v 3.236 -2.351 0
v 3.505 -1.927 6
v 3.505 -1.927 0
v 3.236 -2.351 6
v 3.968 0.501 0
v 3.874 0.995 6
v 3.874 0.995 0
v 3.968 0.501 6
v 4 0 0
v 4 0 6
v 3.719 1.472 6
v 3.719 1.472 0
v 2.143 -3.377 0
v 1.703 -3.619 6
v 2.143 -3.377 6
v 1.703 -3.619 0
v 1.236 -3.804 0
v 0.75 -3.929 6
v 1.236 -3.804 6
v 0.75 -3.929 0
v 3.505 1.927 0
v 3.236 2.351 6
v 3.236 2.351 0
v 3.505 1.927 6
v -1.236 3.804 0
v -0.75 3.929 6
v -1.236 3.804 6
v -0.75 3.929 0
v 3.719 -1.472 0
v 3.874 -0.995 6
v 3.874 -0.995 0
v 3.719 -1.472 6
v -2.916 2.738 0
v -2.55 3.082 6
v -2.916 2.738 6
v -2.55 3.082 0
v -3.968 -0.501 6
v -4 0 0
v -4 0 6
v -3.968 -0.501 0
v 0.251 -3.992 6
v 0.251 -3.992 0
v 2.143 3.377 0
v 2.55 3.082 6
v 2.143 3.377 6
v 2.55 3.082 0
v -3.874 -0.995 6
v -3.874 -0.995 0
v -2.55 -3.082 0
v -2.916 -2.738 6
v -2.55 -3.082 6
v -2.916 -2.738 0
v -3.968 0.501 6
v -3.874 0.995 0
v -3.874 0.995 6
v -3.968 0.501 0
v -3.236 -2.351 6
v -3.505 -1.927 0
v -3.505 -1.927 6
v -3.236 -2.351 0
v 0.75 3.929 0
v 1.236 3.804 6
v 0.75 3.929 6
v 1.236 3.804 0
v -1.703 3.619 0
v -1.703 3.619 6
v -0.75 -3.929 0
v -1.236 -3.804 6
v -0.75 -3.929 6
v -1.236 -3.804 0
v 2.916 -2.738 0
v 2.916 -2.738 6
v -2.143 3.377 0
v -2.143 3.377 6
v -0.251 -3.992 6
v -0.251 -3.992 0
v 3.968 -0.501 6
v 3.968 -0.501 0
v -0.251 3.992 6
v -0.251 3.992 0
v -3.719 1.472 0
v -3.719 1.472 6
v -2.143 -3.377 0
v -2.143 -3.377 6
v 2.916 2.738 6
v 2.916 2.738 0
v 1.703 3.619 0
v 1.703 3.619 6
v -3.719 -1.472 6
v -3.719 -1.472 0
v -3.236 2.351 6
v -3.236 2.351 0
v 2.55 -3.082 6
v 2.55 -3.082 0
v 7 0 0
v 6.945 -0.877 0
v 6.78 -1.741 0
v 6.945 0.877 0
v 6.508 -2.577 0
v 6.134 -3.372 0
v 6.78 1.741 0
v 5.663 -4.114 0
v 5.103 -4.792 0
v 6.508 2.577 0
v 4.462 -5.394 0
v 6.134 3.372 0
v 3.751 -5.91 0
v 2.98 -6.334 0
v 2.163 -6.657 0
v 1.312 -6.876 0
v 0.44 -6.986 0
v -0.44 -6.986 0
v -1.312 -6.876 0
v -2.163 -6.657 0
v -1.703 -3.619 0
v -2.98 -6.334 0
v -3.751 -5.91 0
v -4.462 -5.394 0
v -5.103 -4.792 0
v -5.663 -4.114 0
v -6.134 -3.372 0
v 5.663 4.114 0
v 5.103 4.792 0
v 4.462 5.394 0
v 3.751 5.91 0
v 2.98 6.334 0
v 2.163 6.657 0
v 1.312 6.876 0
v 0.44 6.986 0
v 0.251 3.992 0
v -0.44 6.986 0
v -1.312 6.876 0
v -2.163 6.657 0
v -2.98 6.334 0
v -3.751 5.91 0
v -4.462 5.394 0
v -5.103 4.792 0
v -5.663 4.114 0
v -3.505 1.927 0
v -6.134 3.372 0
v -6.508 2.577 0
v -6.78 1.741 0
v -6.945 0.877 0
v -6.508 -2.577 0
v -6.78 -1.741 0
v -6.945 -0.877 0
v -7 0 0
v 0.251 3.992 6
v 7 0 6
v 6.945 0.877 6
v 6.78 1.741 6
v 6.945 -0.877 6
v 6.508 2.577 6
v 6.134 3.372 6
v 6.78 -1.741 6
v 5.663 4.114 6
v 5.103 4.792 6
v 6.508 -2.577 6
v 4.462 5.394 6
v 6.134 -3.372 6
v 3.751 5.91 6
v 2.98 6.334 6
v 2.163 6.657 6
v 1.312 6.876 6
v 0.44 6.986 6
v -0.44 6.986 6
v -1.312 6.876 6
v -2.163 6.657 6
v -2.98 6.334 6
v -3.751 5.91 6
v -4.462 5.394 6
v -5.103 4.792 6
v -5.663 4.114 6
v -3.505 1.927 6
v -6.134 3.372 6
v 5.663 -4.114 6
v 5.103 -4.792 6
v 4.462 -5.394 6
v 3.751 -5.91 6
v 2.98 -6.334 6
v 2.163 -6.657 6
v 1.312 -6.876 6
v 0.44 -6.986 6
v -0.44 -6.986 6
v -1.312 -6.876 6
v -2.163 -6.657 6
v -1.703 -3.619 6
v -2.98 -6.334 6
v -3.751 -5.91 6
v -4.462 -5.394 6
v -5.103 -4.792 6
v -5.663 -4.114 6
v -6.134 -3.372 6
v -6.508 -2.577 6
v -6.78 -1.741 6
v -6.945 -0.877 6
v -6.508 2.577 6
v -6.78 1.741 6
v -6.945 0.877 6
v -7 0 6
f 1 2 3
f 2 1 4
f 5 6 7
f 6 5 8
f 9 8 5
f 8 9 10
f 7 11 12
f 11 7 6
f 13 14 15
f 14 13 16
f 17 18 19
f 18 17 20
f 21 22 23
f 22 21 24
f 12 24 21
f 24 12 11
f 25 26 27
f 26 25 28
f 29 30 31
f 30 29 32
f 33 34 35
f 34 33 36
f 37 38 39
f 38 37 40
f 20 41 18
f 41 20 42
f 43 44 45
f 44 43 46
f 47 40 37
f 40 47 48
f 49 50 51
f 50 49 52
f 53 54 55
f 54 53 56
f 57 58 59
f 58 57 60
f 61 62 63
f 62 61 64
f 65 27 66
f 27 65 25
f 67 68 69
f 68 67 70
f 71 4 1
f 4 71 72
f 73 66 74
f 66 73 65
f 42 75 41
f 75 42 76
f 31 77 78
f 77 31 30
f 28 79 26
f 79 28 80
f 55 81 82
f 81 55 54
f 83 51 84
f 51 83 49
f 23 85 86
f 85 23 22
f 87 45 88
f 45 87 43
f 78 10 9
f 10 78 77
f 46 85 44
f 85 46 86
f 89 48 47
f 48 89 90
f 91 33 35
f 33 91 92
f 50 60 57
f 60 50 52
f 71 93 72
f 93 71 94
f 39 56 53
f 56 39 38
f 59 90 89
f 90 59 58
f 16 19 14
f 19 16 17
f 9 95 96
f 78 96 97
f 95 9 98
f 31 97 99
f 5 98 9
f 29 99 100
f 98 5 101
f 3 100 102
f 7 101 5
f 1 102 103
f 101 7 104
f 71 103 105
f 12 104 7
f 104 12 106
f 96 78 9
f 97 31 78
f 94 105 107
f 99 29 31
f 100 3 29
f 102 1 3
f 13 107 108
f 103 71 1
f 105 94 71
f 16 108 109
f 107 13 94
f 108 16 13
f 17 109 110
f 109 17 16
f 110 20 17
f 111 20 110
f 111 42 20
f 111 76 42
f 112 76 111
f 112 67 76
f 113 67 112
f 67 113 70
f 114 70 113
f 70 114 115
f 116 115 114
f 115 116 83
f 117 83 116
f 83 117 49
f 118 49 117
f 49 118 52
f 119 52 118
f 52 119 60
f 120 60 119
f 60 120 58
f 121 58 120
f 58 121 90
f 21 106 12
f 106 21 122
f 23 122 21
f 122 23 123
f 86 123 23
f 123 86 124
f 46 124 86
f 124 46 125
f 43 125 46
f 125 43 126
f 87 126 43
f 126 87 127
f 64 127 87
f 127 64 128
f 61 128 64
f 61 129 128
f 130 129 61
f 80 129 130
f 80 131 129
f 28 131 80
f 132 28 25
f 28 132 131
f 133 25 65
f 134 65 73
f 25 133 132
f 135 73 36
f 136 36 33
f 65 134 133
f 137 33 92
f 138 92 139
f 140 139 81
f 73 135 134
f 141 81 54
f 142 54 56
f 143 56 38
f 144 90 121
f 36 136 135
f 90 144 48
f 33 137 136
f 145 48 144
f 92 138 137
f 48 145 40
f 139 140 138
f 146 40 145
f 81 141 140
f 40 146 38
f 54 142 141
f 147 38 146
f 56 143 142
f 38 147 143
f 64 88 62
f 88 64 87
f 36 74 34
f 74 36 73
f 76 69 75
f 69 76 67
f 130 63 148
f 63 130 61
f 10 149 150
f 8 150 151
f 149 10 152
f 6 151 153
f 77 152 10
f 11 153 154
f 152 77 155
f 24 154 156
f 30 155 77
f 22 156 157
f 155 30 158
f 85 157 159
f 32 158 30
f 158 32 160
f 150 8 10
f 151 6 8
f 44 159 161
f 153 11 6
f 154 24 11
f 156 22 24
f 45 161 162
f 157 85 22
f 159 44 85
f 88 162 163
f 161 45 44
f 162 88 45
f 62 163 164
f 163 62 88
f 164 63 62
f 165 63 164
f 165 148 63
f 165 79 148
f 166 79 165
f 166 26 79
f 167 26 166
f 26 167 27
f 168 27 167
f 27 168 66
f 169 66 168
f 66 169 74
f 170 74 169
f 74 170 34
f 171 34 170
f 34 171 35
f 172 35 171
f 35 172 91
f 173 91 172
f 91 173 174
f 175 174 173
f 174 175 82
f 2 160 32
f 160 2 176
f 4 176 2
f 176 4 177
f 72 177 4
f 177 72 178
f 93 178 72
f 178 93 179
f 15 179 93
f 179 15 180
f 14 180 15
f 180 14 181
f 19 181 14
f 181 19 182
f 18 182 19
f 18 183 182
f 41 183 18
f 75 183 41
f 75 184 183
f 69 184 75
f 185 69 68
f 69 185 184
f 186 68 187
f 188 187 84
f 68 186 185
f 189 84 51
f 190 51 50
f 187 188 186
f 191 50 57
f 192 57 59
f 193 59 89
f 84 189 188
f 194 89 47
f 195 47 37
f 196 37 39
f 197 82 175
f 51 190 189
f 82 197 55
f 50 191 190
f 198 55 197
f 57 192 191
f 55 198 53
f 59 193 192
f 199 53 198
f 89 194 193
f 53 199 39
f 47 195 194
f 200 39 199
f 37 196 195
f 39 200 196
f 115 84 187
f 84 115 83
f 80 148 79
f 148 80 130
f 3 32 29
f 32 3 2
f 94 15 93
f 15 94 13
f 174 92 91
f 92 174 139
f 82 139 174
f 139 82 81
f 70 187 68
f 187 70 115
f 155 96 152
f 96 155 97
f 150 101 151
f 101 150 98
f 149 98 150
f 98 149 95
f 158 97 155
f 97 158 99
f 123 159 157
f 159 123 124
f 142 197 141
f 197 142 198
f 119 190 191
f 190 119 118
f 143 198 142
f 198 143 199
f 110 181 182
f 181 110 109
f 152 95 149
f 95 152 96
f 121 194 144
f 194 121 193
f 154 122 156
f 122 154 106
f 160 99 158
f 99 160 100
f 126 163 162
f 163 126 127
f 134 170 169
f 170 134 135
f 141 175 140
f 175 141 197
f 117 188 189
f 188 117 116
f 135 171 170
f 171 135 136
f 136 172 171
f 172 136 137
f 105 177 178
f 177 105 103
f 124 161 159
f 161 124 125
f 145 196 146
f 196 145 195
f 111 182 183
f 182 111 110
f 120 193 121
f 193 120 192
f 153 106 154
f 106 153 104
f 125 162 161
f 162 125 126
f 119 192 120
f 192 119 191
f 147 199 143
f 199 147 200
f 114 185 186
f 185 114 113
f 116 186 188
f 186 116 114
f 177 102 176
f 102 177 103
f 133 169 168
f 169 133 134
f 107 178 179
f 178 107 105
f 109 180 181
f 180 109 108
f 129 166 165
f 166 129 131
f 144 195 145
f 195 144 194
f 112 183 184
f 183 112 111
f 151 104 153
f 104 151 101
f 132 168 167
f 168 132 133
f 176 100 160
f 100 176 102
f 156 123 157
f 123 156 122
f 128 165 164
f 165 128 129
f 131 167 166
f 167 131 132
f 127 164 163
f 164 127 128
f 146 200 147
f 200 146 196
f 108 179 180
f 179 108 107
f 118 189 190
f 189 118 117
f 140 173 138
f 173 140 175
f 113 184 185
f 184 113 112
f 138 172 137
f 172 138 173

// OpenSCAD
$fn = 50;


difference() {
	union() {
		cylinder(h = 6, r = 7.0000000000);
	}
	union() {
		#translate(v = [0.0000000000, 0.0000000000, -100.0000000000]) {
			cylinder(h = 200, r = 3.0000000000);
		}
		#translate(v = [0.0000000000, 0.0000000000, -100.0000000000]) {
			cylinder(h = 200, r = 3.0000000000);
		}
		#translate(v = [0.0000000000, 0.0000000000, -100.0000000000]) {
			cylinder(h = 200, r = 3.0000000000);
		}
		#translate(v = [0.0000000000, 0.0000000000, -100.0000000000]) {
			cylinder(h = 200, r = 3.0000000000);
		}
		#cylinder(h = 6, r = 4.0000000000);
	}
}
